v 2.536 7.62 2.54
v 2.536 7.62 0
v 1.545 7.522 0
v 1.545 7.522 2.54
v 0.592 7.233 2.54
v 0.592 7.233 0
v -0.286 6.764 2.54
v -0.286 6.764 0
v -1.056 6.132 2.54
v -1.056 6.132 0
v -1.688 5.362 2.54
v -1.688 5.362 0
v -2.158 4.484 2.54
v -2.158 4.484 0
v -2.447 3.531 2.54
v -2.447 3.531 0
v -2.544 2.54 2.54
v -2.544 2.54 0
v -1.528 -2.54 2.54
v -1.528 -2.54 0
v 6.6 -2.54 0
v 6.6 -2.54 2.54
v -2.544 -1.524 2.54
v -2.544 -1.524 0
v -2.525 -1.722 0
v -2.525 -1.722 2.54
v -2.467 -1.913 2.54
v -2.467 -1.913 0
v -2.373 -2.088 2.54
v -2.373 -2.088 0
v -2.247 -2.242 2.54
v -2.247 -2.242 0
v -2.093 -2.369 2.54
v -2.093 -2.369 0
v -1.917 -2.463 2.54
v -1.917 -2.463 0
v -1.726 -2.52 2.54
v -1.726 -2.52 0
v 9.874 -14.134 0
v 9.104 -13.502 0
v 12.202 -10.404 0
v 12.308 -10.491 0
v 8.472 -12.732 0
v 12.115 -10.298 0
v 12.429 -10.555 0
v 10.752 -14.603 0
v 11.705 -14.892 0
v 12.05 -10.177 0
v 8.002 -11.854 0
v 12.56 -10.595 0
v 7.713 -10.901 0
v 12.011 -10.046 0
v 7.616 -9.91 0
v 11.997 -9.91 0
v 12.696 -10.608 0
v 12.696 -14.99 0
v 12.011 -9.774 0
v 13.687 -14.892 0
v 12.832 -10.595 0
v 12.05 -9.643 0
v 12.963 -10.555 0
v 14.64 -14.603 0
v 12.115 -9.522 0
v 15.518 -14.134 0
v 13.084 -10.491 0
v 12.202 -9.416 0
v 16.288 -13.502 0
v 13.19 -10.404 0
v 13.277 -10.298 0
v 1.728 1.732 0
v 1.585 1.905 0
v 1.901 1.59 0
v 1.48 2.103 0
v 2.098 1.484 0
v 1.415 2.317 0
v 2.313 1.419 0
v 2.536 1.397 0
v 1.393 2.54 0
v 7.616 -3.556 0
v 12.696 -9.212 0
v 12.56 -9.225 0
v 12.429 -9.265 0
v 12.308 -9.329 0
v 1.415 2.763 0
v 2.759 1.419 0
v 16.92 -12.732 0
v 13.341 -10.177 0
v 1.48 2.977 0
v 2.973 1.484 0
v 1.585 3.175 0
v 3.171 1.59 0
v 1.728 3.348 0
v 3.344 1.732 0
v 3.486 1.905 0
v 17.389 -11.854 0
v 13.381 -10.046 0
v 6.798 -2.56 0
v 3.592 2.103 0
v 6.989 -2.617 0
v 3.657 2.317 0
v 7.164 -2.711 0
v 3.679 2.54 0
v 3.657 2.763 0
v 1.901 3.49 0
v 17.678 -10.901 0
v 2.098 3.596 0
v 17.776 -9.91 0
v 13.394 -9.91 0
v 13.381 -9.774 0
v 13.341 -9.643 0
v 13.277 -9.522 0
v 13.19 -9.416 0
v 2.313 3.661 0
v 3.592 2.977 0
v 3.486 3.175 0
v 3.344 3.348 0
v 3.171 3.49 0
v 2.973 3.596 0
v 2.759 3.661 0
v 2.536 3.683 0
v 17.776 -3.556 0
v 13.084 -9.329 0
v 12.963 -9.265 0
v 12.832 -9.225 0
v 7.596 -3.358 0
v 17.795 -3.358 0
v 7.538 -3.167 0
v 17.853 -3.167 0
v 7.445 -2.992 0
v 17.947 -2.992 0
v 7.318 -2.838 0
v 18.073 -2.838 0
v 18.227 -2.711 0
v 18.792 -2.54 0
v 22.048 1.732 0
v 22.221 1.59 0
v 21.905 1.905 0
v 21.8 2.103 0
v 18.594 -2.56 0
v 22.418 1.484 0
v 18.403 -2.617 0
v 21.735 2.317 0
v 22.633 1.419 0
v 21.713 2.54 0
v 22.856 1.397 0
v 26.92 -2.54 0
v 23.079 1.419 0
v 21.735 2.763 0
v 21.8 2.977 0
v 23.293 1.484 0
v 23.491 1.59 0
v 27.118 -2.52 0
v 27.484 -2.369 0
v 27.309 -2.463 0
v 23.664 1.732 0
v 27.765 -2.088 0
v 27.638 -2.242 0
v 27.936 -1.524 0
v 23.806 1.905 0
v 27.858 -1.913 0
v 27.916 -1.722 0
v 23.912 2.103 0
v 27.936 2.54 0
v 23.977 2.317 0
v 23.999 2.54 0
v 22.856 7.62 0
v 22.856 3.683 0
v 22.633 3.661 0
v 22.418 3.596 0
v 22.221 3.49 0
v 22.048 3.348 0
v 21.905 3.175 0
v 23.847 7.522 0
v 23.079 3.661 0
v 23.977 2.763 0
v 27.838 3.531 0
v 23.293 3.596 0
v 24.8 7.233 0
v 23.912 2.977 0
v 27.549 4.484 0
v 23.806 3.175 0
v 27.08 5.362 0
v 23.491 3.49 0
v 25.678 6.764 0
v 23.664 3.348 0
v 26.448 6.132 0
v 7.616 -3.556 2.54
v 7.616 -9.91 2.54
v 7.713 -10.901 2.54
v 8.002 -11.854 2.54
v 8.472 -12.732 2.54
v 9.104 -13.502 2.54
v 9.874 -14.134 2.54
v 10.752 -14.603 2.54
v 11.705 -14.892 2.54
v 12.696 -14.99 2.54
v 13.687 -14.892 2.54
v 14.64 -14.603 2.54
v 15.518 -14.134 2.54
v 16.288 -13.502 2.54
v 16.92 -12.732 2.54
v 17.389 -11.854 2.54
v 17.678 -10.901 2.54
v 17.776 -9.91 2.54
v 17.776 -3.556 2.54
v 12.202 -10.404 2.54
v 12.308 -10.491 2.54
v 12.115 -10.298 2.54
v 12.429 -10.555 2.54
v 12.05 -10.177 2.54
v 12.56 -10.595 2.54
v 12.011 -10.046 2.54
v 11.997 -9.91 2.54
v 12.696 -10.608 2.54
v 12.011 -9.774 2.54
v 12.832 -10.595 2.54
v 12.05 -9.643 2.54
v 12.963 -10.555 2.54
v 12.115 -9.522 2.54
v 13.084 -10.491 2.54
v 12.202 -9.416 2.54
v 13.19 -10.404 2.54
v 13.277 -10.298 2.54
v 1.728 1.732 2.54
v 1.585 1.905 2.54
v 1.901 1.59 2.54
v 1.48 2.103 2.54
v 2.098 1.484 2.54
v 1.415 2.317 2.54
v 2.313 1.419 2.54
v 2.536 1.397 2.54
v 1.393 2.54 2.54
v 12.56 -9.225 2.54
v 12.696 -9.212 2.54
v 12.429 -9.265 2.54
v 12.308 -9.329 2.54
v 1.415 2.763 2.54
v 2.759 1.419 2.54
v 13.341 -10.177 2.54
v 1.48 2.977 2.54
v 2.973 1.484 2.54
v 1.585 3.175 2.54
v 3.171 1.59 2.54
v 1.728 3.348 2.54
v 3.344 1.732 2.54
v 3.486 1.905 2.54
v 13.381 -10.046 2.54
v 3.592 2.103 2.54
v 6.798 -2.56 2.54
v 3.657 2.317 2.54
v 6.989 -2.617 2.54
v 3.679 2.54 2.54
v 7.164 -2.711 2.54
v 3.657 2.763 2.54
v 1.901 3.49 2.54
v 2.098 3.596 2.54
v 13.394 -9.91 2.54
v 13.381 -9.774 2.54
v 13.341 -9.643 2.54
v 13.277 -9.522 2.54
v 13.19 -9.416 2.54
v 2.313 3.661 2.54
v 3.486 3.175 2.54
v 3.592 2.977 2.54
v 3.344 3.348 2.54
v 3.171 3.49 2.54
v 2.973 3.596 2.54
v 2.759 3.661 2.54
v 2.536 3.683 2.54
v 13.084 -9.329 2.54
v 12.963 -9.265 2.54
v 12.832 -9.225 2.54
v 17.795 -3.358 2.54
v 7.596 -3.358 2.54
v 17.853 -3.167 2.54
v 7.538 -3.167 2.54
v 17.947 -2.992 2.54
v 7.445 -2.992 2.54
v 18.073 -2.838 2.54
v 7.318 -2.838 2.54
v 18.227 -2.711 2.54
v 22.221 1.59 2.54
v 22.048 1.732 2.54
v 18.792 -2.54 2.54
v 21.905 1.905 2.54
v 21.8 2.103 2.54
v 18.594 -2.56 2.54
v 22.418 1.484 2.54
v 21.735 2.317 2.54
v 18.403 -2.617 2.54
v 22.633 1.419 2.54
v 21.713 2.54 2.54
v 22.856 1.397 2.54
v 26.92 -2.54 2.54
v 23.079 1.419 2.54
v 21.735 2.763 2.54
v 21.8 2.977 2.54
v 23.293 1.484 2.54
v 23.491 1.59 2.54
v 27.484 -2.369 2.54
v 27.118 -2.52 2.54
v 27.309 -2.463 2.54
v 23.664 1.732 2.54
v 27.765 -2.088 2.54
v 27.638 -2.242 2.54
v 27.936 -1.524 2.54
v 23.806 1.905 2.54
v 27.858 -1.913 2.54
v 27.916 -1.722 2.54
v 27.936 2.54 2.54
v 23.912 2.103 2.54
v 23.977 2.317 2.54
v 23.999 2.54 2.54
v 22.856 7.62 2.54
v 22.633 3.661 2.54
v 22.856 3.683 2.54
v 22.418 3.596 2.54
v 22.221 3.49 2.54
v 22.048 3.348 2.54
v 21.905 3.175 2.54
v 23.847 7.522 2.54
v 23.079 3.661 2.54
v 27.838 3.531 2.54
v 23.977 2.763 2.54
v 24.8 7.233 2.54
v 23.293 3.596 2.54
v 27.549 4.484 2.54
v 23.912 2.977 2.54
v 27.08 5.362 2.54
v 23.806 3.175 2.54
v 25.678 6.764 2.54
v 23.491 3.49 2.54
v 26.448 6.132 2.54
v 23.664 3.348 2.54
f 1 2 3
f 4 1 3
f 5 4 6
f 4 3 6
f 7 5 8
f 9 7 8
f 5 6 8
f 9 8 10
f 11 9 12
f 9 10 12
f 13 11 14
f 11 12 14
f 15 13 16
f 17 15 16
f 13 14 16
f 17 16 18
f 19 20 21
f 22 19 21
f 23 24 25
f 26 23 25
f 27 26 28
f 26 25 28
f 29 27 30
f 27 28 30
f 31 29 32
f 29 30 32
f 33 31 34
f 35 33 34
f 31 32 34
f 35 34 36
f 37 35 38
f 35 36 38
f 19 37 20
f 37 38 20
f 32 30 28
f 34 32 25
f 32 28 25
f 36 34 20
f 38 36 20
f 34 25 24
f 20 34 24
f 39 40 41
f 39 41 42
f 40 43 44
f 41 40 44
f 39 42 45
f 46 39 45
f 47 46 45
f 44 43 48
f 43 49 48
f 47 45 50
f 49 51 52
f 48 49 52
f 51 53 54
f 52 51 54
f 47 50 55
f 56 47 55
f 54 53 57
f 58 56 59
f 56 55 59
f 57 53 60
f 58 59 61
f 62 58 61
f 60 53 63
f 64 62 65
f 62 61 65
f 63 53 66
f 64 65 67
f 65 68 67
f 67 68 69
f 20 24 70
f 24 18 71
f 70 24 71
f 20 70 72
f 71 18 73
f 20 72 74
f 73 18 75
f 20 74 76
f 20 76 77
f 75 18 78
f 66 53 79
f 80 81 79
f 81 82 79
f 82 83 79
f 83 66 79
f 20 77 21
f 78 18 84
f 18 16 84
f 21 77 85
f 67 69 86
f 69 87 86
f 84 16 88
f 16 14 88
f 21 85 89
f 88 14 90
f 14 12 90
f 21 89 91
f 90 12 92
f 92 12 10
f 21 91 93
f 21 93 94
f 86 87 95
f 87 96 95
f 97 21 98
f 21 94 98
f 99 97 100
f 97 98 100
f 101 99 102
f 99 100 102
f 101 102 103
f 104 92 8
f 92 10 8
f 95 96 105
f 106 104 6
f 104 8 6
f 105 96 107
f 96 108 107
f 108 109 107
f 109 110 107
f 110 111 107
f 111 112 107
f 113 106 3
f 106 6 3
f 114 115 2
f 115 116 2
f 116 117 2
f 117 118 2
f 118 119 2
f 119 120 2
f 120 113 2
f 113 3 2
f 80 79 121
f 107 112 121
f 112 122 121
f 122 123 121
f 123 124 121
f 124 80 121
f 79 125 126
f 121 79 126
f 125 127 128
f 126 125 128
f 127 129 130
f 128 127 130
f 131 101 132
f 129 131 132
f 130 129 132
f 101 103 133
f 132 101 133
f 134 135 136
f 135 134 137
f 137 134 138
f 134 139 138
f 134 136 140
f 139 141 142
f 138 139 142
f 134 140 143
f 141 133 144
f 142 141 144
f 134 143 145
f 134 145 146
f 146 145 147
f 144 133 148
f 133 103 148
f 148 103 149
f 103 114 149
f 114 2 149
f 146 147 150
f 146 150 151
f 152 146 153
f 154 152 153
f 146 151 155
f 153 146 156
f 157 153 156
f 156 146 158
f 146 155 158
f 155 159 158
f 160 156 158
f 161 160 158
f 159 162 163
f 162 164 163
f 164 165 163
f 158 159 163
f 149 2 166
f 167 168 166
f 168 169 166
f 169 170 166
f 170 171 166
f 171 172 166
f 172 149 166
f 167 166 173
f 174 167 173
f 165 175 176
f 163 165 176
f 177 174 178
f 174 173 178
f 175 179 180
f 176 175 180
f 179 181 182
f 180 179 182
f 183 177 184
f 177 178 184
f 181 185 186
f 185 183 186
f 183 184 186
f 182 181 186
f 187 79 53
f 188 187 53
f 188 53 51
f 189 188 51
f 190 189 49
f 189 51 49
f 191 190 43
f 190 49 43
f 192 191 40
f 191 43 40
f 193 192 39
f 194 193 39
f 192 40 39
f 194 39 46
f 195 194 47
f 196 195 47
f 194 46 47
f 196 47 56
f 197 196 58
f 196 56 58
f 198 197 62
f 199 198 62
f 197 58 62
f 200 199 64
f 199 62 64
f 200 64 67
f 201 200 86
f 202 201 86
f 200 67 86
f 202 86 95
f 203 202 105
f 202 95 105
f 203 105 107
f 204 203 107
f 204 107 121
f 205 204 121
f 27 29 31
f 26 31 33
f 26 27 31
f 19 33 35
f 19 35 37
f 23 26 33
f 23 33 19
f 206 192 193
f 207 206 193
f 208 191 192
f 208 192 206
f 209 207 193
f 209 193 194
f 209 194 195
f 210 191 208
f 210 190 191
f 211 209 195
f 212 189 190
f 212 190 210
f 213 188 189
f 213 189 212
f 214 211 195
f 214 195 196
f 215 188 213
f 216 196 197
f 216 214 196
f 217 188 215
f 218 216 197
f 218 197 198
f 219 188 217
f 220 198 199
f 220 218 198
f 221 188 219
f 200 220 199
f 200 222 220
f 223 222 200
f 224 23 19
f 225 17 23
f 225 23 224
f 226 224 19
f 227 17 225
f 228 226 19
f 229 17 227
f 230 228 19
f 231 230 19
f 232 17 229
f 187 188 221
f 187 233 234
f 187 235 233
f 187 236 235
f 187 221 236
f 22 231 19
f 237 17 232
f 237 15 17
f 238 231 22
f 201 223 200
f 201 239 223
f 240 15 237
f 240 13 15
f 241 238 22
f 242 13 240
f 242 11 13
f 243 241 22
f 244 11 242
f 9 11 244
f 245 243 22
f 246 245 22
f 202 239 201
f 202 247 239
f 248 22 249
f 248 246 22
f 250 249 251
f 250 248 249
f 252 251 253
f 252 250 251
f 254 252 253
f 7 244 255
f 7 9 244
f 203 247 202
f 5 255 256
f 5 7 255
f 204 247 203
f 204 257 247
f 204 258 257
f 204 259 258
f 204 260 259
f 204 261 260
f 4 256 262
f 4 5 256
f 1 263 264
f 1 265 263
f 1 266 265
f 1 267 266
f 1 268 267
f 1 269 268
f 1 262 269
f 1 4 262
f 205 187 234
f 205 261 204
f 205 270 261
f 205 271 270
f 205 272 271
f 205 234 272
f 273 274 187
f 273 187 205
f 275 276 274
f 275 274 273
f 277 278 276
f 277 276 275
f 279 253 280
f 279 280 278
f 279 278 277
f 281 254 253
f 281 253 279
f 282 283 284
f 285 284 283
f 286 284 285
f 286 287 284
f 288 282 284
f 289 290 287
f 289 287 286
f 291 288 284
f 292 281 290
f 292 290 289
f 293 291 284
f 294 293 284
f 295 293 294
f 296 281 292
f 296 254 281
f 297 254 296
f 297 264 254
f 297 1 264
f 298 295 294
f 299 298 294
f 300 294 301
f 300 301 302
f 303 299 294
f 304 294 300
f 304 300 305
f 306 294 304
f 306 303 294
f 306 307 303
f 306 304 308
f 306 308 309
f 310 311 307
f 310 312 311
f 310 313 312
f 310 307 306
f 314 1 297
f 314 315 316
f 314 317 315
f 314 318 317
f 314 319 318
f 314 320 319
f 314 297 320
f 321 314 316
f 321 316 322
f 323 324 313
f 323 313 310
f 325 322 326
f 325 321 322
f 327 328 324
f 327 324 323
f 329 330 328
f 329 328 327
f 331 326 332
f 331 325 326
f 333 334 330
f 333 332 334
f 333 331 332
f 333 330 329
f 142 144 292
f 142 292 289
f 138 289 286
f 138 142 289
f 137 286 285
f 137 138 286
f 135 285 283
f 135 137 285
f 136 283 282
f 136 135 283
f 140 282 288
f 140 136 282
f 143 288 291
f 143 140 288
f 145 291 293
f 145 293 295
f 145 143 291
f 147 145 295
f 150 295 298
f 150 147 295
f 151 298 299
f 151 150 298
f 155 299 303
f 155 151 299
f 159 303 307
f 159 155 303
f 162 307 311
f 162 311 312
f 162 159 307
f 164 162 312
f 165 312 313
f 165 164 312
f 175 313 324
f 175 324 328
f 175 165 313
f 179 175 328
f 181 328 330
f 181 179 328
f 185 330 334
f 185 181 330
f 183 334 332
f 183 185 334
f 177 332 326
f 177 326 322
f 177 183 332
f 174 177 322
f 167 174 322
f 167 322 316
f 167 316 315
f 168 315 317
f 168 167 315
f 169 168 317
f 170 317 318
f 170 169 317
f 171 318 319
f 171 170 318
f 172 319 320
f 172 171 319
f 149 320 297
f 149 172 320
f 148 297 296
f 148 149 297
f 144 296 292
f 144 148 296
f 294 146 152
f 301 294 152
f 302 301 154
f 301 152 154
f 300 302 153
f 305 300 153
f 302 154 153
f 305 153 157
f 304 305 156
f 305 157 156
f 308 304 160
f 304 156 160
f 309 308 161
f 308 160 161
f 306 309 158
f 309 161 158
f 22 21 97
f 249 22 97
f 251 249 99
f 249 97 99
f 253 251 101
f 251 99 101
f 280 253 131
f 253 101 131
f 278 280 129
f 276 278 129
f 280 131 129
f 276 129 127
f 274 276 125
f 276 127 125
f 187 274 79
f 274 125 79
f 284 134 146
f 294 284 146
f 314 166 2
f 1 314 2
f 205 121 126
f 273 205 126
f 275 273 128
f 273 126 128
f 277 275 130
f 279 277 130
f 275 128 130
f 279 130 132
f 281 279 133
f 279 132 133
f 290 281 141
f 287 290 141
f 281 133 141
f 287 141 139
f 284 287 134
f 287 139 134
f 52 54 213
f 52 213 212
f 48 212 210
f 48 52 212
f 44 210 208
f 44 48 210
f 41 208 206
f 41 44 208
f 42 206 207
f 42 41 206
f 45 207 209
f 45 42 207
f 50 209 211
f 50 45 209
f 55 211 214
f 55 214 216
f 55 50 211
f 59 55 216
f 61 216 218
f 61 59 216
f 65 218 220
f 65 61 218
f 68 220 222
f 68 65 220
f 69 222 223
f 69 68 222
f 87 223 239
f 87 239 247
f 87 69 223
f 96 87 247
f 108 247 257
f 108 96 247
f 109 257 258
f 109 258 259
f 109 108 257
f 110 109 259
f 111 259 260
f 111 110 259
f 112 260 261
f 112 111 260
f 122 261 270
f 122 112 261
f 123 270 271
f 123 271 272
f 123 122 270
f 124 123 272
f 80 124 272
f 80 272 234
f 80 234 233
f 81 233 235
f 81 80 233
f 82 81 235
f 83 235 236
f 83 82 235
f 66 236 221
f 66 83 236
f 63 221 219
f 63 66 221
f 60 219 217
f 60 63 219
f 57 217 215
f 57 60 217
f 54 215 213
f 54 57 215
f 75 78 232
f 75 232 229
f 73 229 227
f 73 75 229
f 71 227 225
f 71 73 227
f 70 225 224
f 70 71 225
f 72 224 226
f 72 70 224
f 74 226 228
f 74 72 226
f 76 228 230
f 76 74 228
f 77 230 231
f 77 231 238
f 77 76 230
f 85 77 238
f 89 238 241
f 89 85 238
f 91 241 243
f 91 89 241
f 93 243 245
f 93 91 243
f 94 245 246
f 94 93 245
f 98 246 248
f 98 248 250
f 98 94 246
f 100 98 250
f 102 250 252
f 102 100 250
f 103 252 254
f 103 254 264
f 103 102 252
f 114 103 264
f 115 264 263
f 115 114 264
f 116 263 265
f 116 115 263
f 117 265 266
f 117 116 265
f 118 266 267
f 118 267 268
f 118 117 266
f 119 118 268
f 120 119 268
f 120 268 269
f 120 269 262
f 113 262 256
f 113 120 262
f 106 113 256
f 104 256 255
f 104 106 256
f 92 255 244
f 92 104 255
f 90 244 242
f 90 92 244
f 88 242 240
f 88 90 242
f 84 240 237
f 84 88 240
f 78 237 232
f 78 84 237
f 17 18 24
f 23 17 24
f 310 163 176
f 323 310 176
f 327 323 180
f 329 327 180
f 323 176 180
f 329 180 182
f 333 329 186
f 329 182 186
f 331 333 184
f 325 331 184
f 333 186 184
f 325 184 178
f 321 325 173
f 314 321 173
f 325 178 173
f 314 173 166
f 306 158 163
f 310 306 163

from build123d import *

# Parameters (mm, degrees)
SKETCH1_R           = 1.143
SKETCH1_R_2         = 0.6985
BOSS_EXTRUDE1_DEPTH = 2.54


with BuildPart() as part:
    # Sketch1 → Boss-Extrude1 (new body)
    with BuildSketch(Plane.XY):
        with BuildLine():
            Line((-2.544193385, 2.54), (-2.544193385, -1.524))
            ThreePointArc((-2.544193385, -1.524), (-2.246613875, -2.24242049), (-1.528193385, -2.54))
            Line((-1.528193385, -2.54), (6.599806615, -2.54))
            ThreePointArc((6.599806615, -2.54), (7.318227104, -2.83757951), (7.615806615, -3.556))
            Line((7.615806615, -3.556), (7.615806615, -9.91))
            ThreePointArc((7.615806615, -9.91), (12.695806615, -14.99), (17.775806615, -9.91))
            Line((17.775806615, -9.91), (17.775806615, -3.556))
            ThreePointArc((17.775806615, -3.556), (18.073386125, -2.83757951), (18.791806615, -2.54))
            Line((18.791806615, -2.54), (26.919806615, -2.54))
            ThreePointArc((26.919806615, -2.54), (27.638227104, -2.24242049), (27.935806615, -1.524))
            Line((27.935806615, -1.524), (27.935806615, 2.54))
            ThreePointArc((27.935806615, 2.54), (26.447909063, 6.132102448), (22.855806615, 7.62))
            Line((22.855806615, 7.62), (2.535806615, 7.62))
            ThreePointArc((2.535806615, 7.62), (-1.056295834, 6.132102448), (-2.544193385, 2.54))
        make_face()
        with Locations(Location((2.535806615, 2.54, 0), (0, 0, 180))):
            Circle(SKETCH1_R, mode=Mode.SUBTRACT)
        with Locations(Location((12.695806615, -9.91, 0), (0, 0, 180))):
            Circle(SKETCH1_R_2, mode=Mode.SUBTRACT)
        with Locations(Location((22.855806615, 2.54, 0), (0, 0, 180))):
            Circle(SKETCH1_R, mode=Mode.SUBTRACT)
    extrude(amount=BOSS_EXTRUDE1_DEPTH)


solid = part.part
